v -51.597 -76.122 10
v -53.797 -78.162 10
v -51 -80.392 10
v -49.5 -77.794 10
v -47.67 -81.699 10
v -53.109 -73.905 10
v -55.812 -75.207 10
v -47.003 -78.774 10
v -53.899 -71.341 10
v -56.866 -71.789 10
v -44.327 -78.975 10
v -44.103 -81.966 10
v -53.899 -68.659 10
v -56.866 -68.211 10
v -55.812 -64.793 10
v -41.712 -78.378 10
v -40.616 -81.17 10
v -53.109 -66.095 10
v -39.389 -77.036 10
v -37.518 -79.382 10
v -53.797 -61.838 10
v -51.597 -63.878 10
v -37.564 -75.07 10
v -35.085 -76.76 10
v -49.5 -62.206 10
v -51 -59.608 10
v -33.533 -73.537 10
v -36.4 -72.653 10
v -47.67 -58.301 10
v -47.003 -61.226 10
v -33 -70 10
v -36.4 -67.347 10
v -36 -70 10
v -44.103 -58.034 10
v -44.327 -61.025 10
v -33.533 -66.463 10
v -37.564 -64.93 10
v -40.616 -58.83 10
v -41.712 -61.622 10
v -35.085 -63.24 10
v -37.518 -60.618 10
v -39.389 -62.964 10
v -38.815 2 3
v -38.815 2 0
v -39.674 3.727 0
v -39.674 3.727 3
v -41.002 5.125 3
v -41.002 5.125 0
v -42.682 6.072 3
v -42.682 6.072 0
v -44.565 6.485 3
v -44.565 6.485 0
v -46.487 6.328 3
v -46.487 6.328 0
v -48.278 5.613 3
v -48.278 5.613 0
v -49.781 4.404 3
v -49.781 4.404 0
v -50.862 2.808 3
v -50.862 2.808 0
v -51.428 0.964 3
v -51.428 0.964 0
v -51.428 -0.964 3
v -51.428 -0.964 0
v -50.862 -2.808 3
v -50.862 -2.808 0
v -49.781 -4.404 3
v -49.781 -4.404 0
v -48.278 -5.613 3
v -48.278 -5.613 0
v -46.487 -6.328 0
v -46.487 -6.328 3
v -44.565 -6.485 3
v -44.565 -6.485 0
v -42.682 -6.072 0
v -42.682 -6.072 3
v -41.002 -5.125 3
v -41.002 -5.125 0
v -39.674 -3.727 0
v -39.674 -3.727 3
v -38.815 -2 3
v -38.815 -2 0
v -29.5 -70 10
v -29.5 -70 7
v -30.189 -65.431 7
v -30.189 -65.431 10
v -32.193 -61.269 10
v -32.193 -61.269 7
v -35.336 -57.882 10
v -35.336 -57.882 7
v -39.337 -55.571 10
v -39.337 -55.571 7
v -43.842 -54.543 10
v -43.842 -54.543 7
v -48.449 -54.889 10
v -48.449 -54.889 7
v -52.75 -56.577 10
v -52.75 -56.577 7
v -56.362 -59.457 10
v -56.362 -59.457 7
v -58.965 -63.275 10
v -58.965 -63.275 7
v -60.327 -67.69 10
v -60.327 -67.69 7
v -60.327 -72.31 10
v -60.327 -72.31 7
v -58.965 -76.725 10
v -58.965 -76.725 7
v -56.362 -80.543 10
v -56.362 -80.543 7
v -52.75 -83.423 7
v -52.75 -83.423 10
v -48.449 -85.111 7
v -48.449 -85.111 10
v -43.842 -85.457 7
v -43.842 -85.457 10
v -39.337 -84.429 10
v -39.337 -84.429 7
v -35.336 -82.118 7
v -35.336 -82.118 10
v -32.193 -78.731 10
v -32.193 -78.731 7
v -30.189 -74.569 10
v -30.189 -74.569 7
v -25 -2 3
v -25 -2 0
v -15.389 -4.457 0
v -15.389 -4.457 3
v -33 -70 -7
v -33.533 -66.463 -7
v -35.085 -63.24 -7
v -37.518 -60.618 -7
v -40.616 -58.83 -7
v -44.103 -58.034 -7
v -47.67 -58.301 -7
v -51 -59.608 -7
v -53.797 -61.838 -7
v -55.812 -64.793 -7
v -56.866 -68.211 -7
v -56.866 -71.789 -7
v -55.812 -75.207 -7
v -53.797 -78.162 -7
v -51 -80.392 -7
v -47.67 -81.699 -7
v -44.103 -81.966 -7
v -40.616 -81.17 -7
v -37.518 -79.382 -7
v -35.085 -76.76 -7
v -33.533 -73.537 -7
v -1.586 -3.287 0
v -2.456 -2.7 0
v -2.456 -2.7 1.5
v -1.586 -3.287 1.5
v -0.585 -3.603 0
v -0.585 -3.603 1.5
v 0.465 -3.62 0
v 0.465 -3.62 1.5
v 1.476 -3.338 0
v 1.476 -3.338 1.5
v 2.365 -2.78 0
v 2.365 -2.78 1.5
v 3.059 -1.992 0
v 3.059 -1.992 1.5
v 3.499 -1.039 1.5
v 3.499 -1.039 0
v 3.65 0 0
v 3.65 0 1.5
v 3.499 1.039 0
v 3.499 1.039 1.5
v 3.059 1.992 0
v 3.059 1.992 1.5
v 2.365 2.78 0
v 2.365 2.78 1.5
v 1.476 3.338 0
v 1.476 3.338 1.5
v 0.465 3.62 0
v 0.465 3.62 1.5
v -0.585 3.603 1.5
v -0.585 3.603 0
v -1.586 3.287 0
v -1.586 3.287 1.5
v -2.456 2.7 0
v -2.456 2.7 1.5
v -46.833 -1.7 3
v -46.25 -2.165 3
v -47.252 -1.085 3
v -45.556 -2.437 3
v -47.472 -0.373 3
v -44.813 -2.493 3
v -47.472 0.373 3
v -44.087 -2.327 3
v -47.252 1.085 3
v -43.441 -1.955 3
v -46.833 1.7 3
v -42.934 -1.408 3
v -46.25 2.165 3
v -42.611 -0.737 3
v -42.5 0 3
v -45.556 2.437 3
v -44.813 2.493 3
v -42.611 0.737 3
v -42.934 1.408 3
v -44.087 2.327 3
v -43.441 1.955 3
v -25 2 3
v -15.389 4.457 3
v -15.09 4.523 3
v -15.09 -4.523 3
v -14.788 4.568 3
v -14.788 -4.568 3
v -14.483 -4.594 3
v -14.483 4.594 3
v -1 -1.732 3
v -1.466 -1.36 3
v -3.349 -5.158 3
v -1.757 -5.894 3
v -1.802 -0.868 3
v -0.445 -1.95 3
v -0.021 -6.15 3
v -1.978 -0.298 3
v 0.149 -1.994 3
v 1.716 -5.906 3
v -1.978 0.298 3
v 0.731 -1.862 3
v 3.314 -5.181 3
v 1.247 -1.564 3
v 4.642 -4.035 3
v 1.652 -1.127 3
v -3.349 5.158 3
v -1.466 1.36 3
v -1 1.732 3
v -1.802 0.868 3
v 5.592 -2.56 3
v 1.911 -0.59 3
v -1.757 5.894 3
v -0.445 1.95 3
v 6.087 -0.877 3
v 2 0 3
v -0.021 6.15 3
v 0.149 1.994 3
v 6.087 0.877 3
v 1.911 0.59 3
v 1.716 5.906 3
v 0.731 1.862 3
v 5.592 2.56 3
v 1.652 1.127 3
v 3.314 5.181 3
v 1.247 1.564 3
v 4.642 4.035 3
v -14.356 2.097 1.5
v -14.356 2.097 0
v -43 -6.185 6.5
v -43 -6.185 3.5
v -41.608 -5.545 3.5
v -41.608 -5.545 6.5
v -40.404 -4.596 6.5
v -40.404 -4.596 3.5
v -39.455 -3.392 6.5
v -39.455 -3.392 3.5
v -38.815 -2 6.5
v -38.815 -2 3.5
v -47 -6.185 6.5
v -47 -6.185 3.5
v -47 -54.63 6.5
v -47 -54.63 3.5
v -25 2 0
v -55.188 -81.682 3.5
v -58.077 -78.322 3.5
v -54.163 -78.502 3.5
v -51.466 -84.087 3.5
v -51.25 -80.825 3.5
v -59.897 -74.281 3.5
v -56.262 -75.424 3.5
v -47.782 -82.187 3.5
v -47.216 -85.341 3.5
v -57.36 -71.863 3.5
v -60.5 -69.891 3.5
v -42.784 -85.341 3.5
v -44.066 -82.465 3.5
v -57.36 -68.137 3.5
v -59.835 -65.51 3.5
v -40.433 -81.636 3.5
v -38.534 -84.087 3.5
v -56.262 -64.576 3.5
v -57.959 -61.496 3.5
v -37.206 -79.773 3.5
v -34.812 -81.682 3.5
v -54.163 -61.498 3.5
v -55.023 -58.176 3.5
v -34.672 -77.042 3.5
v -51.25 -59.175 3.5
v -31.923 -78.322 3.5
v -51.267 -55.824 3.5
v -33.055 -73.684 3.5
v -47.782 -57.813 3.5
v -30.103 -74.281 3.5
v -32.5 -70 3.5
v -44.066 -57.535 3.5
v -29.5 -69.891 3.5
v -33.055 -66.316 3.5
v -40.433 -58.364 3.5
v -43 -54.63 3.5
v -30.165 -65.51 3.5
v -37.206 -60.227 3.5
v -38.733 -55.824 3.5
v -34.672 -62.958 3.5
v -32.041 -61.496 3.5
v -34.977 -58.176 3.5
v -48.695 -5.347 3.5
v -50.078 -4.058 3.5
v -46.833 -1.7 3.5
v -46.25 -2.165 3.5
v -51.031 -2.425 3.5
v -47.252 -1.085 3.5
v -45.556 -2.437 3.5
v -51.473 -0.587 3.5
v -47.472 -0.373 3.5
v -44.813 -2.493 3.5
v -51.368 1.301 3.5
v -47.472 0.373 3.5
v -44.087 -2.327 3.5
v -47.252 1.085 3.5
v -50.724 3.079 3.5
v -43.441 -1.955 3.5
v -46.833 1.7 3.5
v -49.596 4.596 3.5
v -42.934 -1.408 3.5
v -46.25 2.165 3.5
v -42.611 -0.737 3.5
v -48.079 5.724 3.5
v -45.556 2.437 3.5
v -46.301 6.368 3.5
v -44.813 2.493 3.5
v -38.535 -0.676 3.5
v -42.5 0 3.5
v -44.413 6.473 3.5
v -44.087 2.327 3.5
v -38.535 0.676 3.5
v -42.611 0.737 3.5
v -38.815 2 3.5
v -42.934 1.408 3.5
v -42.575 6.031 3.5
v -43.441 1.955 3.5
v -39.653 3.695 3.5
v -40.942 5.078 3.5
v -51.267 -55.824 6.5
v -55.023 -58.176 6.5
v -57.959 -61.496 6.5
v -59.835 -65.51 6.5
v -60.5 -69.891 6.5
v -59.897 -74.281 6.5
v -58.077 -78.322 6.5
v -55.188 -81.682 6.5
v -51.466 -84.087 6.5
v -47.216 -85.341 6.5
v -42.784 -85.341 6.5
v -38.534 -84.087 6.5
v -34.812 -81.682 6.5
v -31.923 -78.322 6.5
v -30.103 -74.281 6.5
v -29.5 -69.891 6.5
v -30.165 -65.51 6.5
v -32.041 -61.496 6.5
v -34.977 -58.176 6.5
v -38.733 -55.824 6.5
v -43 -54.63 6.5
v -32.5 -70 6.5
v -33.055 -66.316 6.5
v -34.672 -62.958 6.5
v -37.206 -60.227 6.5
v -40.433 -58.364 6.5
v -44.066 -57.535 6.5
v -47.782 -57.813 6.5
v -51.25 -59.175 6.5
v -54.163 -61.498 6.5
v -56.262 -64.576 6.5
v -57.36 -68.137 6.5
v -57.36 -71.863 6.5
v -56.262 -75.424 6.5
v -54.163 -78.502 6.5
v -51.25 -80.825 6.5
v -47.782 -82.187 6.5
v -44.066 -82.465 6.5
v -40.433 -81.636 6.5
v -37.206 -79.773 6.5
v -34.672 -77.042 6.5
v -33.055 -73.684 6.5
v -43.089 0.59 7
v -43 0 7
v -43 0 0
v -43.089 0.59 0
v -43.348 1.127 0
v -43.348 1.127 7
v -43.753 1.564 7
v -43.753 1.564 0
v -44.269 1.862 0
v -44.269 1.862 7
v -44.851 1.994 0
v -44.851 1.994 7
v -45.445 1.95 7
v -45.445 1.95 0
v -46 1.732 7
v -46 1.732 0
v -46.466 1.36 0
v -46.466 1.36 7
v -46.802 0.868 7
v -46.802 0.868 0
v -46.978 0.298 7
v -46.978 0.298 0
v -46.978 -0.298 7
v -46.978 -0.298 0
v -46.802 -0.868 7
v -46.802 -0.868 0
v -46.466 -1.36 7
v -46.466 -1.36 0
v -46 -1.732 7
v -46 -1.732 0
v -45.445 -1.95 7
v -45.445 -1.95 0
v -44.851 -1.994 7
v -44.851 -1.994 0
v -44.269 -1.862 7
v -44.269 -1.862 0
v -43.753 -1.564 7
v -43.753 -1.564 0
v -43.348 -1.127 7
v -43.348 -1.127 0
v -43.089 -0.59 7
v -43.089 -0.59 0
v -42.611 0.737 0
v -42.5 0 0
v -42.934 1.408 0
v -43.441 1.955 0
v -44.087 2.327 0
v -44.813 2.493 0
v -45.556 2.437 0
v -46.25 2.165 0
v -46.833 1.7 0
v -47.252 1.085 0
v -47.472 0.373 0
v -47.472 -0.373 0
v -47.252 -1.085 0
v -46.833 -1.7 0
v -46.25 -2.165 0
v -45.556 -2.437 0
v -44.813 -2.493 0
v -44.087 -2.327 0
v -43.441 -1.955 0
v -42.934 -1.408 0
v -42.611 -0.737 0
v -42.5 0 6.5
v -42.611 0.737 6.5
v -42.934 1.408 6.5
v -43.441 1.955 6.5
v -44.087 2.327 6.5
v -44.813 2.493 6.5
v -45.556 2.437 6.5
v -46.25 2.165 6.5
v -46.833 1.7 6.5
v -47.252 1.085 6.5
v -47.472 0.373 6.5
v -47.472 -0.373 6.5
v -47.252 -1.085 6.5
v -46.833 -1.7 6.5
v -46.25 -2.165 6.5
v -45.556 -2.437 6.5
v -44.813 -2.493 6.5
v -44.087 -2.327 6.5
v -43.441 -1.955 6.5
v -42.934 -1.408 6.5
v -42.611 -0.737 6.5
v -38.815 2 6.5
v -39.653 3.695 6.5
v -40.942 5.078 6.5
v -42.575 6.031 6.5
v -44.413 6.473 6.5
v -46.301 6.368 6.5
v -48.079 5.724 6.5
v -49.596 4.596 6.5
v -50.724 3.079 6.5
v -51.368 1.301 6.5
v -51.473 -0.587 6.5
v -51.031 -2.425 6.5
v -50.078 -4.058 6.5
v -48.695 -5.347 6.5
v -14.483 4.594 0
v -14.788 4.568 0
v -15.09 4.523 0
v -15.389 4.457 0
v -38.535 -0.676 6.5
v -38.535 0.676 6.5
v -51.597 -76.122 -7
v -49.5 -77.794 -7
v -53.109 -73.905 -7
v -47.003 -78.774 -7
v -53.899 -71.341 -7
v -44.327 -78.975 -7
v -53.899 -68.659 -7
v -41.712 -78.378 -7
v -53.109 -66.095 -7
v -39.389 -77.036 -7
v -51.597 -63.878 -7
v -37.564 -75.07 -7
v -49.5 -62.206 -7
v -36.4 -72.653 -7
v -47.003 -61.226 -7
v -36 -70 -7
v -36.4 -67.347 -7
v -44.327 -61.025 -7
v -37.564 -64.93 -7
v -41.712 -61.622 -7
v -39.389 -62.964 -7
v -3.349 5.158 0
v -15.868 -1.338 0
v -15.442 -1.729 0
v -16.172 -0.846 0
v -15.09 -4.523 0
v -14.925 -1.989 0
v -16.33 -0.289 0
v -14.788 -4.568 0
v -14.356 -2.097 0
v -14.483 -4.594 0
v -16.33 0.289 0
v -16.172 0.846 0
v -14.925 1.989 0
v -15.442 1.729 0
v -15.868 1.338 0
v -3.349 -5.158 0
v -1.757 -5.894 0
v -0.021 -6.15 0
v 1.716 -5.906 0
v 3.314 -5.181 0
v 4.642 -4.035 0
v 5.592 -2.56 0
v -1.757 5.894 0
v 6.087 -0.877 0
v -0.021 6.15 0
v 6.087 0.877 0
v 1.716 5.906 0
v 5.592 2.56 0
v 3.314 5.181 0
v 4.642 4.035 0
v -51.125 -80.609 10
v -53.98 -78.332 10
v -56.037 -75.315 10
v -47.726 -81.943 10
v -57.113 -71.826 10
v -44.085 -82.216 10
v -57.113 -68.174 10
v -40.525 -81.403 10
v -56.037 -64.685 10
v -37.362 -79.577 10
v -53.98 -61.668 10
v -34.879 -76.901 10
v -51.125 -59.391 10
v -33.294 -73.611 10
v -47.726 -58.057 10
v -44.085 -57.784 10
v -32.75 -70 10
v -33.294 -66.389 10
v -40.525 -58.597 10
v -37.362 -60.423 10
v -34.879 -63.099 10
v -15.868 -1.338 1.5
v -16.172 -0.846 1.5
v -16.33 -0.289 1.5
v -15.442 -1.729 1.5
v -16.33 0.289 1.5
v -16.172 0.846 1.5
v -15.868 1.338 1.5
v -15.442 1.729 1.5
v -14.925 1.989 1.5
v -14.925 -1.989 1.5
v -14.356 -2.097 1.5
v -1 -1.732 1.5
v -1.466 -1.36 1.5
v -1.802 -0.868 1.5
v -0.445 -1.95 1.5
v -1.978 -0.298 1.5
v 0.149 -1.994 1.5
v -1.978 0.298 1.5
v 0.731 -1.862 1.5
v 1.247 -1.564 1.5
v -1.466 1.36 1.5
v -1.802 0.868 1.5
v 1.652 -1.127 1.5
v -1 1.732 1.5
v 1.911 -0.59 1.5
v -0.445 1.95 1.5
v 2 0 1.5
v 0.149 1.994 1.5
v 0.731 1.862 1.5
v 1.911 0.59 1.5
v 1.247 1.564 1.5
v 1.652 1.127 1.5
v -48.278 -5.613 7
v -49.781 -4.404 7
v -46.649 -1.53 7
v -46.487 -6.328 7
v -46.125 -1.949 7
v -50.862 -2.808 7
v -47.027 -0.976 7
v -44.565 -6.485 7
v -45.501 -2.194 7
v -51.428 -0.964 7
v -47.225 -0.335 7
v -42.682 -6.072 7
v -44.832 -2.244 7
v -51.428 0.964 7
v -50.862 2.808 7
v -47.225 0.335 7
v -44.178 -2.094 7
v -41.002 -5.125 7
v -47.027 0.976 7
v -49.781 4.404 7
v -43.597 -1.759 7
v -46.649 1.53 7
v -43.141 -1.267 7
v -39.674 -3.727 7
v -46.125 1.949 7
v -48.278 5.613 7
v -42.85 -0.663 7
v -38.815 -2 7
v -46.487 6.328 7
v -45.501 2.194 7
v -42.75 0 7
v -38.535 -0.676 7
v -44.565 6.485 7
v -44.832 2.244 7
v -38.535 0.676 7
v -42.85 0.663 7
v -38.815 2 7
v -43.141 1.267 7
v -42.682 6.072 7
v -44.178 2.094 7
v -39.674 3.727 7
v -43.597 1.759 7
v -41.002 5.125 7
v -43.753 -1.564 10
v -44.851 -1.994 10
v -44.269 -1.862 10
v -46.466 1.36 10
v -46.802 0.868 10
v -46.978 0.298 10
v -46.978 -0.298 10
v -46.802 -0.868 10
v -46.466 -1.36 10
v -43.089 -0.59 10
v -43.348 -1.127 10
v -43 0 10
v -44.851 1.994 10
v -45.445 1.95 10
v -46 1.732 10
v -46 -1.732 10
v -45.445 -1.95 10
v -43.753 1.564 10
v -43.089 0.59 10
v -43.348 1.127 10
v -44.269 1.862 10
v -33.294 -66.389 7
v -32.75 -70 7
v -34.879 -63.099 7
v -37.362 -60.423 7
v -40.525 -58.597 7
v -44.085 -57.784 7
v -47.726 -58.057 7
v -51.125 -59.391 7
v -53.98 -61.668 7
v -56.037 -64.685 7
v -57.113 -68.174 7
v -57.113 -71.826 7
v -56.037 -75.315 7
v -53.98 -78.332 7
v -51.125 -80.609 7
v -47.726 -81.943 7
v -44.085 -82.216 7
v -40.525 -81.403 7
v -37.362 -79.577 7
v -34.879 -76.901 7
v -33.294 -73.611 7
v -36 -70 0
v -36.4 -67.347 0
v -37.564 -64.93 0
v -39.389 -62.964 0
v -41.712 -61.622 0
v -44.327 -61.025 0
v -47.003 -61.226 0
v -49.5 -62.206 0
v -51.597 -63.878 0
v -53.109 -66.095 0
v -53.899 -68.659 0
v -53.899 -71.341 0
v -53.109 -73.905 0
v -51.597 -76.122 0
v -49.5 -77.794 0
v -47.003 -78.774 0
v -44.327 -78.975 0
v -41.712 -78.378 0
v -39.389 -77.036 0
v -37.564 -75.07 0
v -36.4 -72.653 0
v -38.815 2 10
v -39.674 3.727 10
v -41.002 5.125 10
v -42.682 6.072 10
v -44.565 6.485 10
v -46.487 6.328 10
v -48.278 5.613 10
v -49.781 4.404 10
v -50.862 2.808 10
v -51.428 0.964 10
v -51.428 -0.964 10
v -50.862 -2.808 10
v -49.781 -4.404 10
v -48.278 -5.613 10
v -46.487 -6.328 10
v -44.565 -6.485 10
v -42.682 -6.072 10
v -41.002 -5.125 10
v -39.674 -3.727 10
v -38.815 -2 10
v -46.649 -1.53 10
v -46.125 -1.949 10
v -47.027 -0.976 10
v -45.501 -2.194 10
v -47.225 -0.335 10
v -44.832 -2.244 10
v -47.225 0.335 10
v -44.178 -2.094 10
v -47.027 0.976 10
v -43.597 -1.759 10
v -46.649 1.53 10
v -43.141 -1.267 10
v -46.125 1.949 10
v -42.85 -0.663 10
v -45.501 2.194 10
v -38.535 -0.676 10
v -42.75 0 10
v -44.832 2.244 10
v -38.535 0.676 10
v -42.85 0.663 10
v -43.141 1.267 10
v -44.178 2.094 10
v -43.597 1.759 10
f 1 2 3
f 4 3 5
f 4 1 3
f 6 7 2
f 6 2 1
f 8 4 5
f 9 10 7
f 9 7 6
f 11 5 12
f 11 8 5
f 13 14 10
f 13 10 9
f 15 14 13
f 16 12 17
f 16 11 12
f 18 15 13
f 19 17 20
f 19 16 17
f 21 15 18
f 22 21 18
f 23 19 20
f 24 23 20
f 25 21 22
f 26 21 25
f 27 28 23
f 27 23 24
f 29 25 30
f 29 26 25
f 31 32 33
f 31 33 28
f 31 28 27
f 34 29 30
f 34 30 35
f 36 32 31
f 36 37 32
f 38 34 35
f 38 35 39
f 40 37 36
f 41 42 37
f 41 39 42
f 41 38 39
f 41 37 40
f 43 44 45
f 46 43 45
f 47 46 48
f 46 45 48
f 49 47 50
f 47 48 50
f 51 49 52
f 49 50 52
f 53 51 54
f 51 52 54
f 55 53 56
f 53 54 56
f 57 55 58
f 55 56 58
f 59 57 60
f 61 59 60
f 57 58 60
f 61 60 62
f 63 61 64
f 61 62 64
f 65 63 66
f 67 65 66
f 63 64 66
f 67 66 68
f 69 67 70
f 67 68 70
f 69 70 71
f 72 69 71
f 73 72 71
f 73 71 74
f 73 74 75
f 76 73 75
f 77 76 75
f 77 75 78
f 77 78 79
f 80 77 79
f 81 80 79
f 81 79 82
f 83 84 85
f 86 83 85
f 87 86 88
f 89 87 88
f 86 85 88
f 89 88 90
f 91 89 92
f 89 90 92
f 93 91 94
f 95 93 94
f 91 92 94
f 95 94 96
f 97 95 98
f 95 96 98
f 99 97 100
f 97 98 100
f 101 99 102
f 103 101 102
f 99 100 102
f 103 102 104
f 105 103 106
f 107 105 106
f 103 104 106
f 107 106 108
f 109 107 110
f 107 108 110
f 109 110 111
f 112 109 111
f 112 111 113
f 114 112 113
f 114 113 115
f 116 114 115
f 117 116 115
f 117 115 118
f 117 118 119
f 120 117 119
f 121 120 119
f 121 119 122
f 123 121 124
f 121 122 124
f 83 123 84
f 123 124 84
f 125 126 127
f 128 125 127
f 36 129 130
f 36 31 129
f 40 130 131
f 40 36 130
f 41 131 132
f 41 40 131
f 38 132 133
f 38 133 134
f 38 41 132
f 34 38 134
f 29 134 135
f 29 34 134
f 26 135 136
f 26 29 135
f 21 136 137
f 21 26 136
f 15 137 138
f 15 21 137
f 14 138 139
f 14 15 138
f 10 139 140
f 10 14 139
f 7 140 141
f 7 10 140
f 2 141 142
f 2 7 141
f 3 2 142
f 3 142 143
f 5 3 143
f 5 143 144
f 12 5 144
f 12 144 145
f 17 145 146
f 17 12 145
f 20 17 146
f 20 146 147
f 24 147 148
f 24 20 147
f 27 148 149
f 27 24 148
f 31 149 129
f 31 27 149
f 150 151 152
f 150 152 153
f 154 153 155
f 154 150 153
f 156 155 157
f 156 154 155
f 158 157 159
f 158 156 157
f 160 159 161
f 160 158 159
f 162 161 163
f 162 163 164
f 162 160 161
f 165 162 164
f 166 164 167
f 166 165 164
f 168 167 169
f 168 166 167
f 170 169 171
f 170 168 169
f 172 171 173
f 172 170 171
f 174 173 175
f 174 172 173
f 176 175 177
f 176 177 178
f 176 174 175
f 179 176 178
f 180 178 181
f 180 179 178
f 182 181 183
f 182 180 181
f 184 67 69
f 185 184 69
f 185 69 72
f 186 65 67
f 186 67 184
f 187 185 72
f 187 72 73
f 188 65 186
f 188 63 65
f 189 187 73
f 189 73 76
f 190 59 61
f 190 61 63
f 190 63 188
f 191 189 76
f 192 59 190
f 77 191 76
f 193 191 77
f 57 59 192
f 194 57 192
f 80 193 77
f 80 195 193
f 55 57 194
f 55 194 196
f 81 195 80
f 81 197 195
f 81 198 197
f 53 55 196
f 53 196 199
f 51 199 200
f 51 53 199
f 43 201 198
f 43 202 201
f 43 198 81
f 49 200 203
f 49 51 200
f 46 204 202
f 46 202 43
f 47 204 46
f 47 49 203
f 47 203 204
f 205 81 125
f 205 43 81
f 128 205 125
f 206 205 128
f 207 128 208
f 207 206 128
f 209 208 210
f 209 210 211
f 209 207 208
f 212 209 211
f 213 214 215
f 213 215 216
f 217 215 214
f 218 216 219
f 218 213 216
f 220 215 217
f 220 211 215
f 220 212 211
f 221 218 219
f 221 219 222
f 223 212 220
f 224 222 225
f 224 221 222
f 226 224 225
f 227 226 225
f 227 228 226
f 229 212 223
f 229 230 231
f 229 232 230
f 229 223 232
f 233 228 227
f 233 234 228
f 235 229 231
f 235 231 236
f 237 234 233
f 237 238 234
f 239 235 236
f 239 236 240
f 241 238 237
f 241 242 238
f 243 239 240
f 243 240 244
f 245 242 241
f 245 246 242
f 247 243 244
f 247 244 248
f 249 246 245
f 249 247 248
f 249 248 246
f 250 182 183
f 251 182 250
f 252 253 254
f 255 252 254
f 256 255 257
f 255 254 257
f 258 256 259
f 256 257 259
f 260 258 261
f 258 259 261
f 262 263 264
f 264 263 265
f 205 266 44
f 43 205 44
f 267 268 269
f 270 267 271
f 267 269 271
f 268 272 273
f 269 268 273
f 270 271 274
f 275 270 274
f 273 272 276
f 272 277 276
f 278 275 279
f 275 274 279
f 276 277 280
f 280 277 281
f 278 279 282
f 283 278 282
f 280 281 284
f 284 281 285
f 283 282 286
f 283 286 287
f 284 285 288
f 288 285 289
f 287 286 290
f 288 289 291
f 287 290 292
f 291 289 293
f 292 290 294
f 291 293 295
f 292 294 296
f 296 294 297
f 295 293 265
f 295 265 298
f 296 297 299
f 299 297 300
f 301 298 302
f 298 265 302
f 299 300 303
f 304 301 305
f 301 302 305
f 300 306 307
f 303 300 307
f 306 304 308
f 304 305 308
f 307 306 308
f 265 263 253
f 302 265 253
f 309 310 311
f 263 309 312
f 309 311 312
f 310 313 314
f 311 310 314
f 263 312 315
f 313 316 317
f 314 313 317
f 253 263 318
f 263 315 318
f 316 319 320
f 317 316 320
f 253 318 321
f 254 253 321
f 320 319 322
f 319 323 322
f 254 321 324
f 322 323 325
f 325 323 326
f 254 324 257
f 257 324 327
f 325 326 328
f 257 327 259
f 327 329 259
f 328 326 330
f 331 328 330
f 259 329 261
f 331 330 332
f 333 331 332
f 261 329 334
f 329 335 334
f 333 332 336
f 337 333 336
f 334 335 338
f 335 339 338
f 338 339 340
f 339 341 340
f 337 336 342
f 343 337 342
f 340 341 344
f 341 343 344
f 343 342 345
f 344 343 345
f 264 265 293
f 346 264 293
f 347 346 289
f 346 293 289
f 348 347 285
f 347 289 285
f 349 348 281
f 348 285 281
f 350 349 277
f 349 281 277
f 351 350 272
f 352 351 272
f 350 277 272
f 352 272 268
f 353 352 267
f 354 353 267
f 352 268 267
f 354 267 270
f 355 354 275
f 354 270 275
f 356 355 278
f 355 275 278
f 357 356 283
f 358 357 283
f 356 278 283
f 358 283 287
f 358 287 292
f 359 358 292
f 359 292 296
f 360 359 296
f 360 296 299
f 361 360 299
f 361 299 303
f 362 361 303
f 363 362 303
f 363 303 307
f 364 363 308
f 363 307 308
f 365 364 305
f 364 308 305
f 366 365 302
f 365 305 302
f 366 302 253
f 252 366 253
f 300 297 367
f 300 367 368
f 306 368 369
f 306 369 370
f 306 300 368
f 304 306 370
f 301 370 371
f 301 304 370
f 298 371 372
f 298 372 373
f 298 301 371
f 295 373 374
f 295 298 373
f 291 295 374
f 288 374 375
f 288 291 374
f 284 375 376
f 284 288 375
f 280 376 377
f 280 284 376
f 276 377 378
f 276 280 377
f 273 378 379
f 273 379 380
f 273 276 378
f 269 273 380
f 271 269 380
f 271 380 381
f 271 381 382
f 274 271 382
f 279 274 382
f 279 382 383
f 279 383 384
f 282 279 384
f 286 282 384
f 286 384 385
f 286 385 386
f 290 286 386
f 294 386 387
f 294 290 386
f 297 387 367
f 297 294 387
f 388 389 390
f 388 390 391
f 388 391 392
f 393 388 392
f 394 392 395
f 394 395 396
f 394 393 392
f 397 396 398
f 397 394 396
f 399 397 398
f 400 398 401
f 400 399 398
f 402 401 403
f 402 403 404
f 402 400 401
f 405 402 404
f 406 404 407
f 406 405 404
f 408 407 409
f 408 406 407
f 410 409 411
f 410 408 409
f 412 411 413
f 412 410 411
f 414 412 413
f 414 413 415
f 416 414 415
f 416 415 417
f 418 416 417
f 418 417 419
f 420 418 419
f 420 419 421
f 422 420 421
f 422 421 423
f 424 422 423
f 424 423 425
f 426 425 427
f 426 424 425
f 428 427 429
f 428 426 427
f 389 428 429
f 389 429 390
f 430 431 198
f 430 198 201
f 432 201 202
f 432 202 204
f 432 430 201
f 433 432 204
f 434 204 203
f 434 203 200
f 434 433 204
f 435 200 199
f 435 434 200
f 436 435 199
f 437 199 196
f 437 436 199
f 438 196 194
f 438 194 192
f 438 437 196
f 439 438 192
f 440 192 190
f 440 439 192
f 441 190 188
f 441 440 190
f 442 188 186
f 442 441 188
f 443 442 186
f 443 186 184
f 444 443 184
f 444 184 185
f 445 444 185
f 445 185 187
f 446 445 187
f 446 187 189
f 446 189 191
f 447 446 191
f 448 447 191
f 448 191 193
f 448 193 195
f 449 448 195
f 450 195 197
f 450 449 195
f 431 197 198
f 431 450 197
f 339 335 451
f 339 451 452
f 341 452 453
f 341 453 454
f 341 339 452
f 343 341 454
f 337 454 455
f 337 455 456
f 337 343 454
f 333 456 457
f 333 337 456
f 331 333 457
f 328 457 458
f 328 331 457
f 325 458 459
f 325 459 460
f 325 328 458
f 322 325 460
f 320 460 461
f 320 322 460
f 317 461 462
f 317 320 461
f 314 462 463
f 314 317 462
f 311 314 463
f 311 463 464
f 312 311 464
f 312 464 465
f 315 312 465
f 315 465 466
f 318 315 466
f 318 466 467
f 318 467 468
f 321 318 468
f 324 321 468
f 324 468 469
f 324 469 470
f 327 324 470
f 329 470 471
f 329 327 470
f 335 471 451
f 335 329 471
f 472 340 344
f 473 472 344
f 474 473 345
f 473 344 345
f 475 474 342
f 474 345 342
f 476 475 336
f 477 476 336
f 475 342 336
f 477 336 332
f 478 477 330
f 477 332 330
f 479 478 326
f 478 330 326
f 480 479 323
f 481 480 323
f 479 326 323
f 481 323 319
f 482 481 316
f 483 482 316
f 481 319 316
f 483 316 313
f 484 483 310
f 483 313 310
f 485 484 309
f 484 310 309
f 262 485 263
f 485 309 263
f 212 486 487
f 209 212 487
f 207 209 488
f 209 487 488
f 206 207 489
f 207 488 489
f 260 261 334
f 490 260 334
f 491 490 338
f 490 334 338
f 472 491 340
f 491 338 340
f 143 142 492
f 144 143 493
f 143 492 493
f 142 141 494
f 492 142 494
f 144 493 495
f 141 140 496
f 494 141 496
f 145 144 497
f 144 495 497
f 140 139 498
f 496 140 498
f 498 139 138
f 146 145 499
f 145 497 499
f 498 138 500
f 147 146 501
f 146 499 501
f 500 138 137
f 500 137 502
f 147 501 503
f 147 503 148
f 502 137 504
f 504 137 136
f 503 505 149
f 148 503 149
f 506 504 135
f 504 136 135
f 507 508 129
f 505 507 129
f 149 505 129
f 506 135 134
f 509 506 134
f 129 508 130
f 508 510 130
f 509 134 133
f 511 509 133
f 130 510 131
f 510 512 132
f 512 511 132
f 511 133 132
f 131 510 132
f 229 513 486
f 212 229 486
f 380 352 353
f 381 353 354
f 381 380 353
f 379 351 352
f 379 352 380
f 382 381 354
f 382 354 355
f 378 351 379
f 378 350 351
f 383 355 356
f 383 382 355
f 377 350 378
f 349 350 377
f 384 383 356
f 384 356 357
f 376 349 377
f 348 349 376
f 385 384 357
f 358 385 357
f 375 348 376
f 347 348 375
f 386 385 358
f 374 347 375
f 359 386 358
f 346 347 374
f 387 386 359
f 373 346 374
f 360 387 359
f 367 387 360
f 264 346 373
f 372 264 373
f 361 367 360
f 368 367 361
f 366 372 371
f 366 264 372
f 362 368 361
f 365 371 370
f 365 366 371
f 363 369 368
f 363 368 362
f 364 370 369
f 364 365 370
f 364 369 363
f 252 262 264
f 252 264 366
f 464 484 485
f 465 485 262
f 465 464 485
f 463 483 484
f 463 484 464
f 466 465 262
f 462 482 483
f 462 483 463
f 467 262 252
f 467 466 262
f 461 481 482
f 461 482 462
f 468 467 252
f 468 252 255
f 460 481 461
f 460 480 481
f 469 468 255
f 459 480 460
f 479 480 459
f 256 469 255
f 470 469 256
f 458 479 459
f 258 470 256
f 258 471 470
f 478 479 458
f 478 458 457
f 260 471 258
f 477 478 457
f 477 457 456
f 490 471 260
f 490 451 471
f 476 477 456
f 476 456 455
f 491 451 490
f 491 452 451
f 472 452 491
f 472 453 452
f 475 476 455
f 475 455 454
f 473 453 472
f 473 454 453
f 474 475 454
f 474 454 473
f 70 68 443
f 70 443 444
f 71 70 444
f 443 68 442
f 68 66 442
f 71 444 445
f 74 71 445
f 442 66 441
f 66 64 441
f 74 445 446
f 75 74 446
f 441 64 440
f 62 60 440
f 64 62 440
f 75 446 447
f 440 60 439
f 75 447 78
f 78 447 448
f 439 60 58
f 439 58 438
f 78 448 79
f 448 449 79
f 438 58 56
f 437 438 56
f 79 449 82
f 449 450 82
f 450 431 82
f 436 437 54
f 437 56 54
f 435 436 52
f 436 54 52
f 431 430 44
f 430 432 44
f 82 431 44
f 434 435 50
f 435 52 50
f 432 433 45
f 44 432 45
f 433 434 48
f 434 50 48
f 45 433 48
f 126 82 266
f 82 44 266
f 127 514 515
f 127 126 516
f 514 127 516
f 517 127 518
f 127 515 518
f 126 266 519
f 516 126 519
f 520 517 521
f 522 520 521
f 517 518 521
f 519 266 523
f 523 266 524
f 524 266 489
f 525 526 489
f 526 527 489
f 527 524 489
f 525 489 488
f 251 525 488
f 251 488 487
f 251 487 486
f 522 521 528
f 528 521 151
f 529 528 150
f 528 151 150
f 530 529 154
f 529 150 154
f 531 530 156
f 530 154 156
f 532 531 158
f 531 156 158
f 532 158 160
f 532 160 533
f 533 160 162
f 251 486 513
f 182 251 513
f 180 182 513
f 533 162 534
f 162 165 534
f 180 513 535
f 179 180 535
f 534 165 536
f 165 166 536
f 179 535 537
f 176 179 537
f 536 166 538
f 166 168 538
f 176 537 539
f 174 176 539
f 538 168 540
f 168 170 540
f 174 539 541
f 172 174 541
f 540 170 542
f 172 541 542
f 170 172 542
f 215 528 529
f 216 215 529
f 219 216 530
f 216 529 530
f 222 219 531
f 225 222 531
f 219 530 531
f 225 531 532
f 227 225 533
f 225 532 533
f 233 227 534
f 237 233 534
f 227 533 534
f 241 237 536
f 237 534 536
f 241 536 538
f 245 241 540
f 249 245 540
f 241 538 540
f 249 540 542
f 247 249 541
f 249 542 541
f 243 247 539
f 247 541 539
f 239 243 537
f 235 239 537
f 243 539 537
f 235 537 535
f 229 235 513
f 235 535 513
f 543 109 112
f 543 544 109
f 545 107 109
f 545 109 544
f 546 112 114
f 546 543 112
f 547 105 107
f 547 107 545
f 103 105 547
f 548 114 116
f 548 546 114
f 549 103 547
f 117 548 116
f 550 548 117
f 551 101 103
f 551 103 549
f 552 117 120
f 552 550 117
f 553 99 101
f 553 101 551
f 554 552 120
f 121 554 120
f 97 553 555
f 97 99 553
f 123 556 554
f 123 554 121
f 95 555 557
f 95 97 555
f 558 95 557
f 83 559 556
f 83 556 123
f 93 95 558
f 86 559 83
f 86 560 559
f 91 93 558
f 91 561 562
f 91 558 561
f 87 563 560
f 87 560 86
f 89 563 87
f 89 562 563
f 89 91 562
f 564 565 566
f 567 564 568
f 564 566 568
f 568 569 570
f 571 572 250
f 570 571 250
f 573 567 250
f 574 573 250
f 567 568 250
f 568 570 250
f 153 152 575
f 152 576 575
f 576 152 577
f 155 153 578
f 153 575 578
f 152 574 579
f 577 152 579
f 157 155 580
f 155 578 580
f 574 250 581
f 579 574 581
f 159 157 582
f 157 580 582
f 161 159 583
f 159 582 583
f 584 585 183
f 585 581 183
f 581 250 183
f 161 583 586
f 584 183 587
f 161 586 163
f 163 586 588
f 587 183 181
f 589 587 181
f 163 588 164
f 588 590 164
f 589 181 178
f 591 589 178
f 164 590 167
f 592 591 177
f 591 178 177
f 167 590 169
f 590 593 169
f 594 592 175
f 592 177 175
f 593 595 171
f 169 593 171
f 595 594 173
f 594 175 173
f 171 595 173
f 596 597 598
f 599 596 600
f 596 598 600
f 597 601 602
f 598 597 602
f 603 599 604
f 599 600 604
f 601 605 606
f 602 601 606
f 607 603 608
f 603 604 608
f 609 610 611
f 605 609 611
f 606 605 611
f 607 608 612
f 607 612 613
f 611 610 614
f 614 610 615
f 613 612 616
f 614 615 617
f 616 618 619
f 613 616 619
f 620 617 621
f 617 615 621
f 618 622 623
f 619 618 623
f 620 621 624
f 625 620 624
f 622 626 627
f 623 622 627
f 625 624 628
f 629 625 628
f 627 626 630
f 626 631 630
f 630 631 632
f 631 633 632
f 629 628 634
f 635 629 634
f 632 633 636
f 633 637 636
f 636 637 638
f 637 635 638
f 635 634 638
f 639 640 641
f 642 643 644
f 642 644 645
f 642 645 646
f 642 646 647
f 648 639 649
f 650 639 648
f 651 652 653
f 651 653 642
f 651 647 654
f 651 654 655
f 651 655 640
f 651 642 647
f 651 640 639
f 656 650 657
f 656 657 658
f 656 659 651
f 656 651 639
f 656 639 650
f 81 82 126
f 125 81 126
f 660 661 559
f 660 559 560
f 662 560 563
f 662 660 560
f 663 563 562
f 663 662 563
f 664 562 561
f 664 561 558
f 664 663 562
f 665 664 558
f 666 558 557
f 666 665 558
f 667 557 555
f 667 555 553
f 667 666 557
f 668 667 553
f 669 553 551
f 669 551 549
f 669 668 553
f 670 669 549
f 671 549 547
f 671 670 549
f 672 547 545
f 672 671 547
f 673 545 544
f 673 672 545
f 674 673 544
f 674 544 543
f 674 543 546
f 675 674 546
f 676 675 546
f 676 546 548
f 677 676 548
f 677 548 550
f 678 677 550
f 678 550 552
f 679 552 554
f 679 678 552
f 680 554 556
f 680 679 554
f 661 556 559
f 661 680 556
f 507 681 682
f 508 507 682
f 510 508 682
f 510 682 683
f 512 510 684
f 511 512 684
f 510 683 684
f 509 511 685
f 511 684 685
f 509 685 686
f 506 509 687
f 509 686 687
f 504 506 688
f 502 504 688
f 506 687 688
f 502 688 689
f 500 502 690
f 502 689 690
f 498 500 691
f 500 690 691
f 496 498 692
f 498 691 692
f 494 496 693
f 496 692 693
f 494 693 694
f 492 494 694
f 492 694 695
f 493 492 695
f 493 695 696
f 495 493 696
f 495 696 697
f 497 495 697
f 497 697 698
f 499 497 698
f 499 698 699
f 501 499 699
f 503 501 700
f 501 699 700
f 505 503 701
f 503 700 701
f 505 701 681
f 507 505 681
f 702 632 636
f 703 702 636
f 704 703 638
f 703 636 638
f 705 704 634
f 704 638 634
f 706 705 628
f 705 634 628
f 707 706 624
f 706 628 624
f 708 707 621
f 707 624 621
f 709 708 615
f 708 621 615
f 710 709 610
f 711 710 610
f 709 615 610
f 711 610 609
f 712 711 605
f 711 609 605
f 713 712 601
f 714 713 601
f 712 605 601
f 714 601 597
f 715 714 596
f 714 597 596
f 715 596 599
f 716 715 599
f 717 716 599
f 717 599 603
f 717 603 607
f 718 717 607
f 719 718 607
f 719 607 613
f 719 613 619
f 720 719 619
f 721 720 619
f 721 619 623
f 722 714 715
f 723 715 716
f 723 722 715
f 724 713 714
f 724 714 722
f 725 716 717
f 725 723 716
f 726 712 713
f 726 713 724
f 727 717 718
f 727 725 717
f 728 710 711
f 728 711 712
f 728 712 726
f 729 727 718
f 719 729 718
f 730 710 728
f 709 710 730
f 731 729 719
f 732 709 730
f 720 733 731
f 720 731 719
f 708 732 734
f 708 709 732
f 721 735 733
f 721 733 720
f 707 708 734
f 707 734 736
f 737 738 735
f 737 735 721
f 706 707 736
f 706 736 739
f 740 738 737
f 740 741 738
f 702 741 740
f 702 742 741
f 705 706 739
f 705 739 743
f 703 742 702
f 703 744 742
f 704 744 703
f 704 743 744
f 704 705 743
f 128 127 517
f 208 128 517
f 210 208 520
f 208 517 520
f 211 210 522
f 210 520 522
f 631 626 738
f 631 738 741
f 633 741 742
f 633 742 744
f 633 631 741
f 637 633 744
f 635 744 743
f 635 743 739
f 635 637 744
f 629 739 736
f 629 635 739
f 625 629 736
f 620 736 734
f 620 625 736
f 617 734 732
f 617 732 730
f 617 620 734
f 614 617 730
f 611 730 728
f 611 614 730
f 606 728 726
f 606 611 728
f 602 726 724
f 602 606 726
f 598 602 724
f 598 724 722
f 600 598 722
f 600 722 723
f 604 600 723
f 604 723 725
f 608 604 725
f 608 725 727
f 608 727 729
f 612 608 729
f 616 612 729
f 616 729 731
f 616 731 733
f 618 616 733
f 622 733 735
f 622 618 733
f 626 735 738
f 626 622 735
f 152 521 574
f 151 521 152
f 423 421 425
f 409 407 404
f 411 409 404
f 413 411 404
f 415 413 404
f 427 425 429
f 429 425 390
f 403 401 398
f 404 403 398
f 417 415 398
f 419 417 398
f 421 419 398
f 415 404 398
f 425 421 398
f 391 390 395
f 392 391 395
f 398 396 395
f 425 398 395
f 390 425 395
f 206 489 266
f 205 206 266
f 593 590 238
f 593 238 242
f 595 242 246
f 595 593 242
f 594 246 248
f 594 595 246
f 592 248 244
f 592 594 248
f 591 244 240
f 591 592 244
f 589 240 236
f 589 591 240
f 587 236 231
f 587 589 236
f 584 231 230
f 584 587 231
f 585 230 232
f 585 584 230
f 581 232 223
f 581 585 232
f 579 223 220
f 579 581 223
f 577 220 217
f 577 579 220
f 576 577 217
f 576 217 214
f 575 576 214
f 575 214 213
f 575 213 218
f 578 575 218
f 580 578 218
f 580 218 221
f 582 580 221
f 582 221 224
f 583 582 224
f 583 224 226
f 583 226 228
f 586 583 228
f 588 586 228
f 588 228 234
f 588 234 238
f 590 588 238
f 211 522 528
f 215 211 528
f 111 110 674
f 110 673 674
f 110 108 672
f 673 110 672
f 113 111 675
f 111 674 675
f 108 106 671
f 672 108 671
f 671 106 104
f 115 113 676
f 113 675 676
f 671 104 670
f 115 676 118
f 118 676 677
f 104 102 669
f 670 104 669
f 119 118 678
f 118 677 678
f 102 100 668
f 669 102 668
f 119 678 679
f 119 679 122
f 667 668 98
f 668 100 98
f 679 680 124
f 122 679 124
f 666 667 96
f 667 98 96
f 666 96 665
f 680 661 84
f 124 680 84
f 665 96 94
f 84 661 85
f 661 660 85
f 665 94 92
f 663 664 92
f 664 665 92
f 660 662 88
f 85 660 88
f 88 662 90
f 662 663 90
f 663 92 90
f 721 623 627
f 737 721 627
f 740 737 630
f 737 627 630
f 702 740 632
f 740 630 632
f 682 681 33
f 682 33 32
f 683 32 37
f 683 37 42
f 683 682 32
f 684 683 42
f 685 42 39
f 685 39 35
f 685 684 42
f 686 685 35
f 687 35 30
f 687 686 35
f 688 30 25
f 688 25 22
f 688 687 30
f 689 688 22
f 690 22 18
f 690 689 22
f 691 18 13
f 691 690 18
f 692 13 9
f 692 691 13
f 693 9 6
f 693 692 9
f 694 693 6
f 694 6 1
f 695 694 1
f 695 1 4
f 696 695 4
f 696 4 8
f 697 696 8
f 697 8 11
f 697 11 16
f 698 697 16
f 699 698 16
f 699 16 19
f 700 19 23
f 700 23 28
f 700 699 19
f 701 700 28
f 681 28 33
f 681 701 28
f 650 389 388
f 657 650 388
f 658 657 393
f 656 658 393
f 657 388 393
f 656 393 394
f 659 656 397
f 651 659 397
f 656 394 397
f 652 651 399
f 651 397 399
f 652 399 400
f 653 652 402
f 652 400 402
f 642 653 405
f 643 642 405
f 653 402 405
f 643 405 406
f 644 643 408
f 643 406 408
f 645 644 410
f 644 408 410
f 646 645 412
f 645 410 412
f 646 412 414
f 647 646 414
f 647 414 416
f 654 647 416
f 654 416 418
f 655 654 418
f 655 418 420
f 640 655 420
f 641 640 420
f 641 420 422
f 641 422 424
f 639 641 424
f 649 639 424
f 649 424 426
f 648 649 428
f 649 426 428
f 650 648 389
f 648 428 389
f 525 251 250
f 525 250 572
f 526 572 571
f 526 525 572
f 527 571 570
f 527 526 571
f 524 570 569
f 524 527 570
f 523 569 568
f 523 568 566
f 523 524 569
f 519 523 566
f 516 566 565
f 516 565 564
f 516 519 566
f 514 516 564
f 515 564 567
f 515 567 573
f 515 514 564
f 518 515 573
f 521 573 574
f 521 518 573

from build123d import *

# Parameters (mm, degrees)
F5_R       = 2.5
F5_R_2     = 2
F6_DEPTH   = 3
F7_DEPTH   = 1.5
F8_R       = 12.5
F8_R_2     = 2.5
F9_DEPTH   = 3
F10_R      = 2.25
F11_DEPTH  = 3
F10_R_2    = 2
F12_DEPTH  = 7
F5_R_3     = 12
F5_R_4     = 9
F13_DEPTH  = 10
F14_R      = 15.5
F14_R_2    = 12.25
F15_DEPTH  = 3
F17_DEPTH  = 7
F12_FACE_R = 2
F18_DEPTH  = 3


with BuildPart() as f6:
    # F5 (on Top) → F6 (new body, through all)
    with BuildSketch(Plane.XY):
        with BuildLine():
            ThreePointArc((-3.349309, -5.157968), (6.15, 0), (-3.349309, 5.157968))
            Line((-3.349309, 5.157968), (-14.482672, 4.594112))
            ThreePointArc((-14.482672, 4.594112), (-14.939377, 4.54805), (-15.389218, 4.456701))
            Line((-15.389218, 4.456701), (-25, 2))
            Line((-25, 2), (-38.815342, 2))
            ThreePointArc((-38.815342, 2), (-51.5, 0), (-38.815342, -2))
            Line((-38.815342, -2), (-25, -2))
            Line((-25, -2), (-15.389218, -4.456701))
            ThreePointArc((-15.389218, -4.456701), (-14.939377, -4.54805), (-14.482672, -4.594112))
            Line((-14.482672, -4.594112), (-3.349309, -5.157968))
        make_face()
        with Locations((-45, 0)):
            Circle(F5_R, mode=Mode.SUBTRACT)
        with BuildLine():
            ThreePointArc((-2.456115, 2.7), (3.65, 0), (-2.456115, -2.7))
            Line((-2.456115, -2.7), (-14.35622, -2.097312))
            ThreePointArc((-14.35622, -2.097312), (-16.35, 0), (-14.35622, 2.097312))
            Line((-14.35622, 2.097312), (-2.456115, 2.7))
        make_face(mode=Mode.SUBTRACT)
        with BuildLine():
            Line((-14.35622, -2.097312), (-2.456115, -2.7))
            ThreePointArc((-2.456115, -2.7), (3.65, 0), (-2.456115, 2.7))
            Line((-2.456115, 2.7), (-14.35622, 2.097312))
            ThreePointArc((-14.35622, 2.097312), (-16.35, 0), (-14.35622, -2.097312))
        make_face()
        Circle(F5_R_2, mode=Mode.SUBTRACT)
    extrude(amount=F6_DEPTH)

    # F5 (on Top) → F7 (cut)
    with BuildSketch(Plane.XY):
        with BuildLine():
            Line((-14.35622, -2.097312), (-2.456115, -2.7))
            ThreePointArc((-2.456115, -2.7), (3.65, 0), (-2.456115, 2.7))
            Line((-2.456115, 2.7), (-14.35622, 2.097312))
            ThreePointArc((-14.35622, 2.097312), (-16.35, 0), (-14.35622, -2.097312))
        make_face()
        Circle(F5_R_2, mode=Mode.SUBTRACT)
    extrude(amount=F7_DEPTH, mode=Mode.SUBTRACT)


with BuildPart() as f9:
    # F8 (on offset) → F9 (new body, through all)
    with BuildSketch(Plane.XY.offset(3.5)):
        with BuildLine():
            ThreePointArc((-38.815342, -2), (-38.5, 0), (-38.815342, 2))
            ThreePointArc((-38.815342, 2), (-49.596194, 4.596194), (-47, -6.184658))
            Line((-47, -6.184658), (-47, -54.629574))
            ThreePointArc((-47, -54.629574), (-45, -85.5), (-43, -54.629574))
            Line((-43, -54.629574), (-43, -6.184658))
            ThreePointArc((-43, -6.184658), (-40.403806, -4.596194), (-38.815342, -2))
        make_face()
        with Locations((-45, -70)):
            Circle(F8_R, mode=Mode.SUBTRACT)
        with Locations((-45, 0)):
            Circle(F8_R_2, mode=Mode.SUBTRACT)
    extrude(amount=F9_DEPTH)


with BuildPart() as f11:
    # F10 (on offset) → F11 (new body)
    with BuildSketch(Plane.XY.offset(7)):
        with BuildLine():
            ThreePointArc((-38.815342, 2), (-51.5, 0), (-38.815342, -2))
            ThreePointArc((-38.815342, -2), (-38.5, 0), (-38.815342, 2))
        make_face()
        with Locations((-45, 0)):
            Circle(F10_R, mode=Mode.SUBTRACT)
    extrude(amount=F11_DEPTH)


with BuildPart() as f12:
    # F10 (on offset) → F12 (new body, through all)
    with BuildSketch(Plane.XY.offset(7)):
        with Locations((-45, 0)):
            Circle(F10_R_2)
    extrude(amount=-F12_DEPTH)

    # F12_face (on face) → F18 (join, through all)
    with BuildSketch(Plane(origin=(-45, 0, 7), x_dir=(1, 0, 0), z_dir=(0, 0, 1))):
        Circle(F12_FACE_R)
    extrude(amount=F18_DEPTH)


with BuildPart() as f13:
    # F5 (on Top) → F13 (new body, through all)
    with BuildSketch(Plane.XY):
        with Locations((-45, -70)):
            Circle(F5_R_3)
        with Locations((-45, -70)):
            Circle(F5_R_4, mode=Mode.SUBTRACT)
    extrude(amount=F13_DEPTH)

    # F5 (on Top) → F17 (join, through all)
    with BuildSketch(Plane.XY):
        with Locations((-45, -70)):
            Circle(F5_R_3)
        with Locations((-45, -70)):
            Circle(F5_R_4, mode=Mode.SUBTRACT)
    extrude(amount=-F17_DEPTH)


with BuildPart() as f15:
    # F14 (on offset) → F15 (new body, through all)
    with BuildSketch(Plane.XY.offset(7)):
        with Locations((-45, -70)):
            Circle(F14_R)
        with Locations((-45, -70)):
            Circle(F14_R_2, mode=Mode.SUBTRACT)
    extrude(amount=F15_DEPTH)


solid = Compound([f6.part, f9.part, f11.part, f12.part, f13.part, f15.part])
